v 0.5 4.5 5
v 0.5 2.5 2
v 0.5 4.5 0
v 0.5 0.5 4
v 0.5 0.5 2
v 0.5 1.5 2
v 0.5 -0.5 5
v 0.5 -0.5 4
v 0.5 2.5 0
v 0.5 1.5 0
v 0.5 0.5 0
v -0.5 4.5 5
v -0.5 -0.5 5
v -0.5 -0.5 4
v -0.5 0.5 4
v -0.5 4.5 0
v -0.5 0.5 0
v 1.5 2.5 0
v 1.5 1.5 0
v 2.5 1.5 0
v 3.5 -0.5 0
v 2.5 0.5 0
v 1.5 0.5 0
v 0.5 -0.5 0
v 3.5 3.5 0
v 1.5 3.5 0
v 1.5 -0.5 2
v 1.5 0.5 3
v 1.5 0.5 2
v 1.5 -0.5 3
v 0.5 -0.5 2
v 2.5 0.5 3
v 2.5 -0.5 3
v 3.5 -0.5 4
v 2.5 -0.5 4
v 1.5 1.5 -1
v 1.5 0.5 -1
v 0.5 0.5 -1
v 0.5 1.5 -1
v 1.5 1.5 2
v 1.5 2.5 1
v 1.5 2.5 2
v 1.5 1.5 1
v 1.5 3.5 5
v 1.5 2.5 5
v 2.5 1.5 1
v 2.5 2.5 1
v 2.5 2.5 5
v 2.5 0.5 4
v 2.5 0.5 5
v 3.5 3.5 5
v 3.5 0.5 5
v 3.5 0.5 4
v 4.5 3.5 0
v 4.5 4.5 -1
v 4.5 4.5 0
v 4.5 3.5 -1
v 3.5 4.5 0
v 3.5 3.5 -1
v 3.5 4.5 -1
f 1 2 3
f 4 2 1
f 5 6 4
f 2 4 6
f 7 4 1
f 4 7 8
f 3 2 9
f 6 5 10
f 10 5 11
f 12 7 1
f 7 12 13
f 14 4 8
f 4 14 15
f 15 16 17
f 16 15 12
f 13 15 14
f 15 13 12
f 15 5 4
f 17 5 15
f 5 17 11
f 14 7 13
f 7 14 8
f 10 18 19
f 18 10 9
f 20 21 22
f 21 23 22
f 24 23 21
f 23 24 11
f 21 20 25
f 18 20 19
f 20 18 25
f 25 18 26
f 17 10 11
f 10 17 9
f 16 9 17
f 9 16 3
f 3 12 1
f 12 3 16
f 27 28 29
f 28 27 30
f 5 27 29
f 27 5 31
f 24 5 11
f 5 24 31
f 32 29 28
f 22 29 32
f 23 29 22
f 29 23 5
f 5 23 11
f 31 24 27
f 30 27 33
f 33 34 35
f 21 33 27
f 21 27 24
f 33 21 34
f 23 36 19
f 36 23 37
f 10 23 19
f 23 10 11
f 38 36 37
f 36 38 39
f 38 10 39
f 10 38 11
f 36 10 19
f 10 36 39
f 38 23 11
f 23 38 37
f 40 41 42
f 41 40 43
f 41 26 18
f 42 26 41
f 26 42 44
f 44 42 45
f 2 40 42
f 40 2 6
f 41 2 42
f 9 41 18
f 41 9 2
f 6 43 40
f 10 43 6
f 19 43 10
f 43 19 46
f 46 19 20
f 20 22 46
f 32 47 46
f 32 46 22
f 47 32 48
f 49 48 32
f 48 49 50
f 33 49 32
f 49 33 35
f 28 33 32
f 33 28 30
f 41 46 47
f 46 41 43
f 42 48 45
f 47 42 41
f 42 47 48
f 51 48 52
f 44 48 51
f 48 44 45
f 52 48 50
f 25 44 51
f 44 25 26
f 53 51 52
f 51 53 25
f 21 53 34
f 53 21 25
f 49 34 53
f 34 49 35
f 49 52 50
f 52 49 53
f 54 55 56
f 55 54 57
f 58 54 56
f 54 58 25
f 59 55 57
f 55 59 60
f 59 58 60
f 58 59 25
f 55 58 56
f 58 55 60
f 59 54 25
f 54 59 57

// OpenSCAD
union() {
    translate([0, 0, 4.5]) color([1, 0, 0]) cube([1, 1, 1], center=true);
    translate([0, 1, 2.5]) cube([1, 1, 5], center=true);
    translate([0, 2, 2.5]) cube([1, 1, 5], center=true);
    translate([0, 3, 2.5]) cube([1, 1, 5], center=true);
    translate([0, 4, 2.5]) cube([1, 1, 5], center=true);
    translate([1, 0, 1.0]) cube([1, 1, 2], center=true);
    translate([1, 1, -0.5]) color([0, 0, 1]) cube([1, 1, 1], center=true);
    translate([1, 2, 1.0]) cube([1, 1, 2], center=true);
    translate([2, 0, 1.5]) cube([1, 1, 3], center=true);
    translate([2, 2, 0.5]) cube([1, 1, 1], center=true);
    translate([2, 3, 2.5]) cube([1, 1, 5], center=true);
    translate([3, 0, 2.0]) cube([1, 1, 4], center=true);
    translate([3, 1, 2.5]) cube([1, 1, 5], center=true);
    translate([3, 2, 2.5]) cube([1, 1, 5], center=true);
    translate([3, 3, 2.5]) cube([1, 1, 5], center=true);
    translate([4, 4, -0.5]) color([0, 0, 1]) cube([1, 1, 1], center=true);
}
